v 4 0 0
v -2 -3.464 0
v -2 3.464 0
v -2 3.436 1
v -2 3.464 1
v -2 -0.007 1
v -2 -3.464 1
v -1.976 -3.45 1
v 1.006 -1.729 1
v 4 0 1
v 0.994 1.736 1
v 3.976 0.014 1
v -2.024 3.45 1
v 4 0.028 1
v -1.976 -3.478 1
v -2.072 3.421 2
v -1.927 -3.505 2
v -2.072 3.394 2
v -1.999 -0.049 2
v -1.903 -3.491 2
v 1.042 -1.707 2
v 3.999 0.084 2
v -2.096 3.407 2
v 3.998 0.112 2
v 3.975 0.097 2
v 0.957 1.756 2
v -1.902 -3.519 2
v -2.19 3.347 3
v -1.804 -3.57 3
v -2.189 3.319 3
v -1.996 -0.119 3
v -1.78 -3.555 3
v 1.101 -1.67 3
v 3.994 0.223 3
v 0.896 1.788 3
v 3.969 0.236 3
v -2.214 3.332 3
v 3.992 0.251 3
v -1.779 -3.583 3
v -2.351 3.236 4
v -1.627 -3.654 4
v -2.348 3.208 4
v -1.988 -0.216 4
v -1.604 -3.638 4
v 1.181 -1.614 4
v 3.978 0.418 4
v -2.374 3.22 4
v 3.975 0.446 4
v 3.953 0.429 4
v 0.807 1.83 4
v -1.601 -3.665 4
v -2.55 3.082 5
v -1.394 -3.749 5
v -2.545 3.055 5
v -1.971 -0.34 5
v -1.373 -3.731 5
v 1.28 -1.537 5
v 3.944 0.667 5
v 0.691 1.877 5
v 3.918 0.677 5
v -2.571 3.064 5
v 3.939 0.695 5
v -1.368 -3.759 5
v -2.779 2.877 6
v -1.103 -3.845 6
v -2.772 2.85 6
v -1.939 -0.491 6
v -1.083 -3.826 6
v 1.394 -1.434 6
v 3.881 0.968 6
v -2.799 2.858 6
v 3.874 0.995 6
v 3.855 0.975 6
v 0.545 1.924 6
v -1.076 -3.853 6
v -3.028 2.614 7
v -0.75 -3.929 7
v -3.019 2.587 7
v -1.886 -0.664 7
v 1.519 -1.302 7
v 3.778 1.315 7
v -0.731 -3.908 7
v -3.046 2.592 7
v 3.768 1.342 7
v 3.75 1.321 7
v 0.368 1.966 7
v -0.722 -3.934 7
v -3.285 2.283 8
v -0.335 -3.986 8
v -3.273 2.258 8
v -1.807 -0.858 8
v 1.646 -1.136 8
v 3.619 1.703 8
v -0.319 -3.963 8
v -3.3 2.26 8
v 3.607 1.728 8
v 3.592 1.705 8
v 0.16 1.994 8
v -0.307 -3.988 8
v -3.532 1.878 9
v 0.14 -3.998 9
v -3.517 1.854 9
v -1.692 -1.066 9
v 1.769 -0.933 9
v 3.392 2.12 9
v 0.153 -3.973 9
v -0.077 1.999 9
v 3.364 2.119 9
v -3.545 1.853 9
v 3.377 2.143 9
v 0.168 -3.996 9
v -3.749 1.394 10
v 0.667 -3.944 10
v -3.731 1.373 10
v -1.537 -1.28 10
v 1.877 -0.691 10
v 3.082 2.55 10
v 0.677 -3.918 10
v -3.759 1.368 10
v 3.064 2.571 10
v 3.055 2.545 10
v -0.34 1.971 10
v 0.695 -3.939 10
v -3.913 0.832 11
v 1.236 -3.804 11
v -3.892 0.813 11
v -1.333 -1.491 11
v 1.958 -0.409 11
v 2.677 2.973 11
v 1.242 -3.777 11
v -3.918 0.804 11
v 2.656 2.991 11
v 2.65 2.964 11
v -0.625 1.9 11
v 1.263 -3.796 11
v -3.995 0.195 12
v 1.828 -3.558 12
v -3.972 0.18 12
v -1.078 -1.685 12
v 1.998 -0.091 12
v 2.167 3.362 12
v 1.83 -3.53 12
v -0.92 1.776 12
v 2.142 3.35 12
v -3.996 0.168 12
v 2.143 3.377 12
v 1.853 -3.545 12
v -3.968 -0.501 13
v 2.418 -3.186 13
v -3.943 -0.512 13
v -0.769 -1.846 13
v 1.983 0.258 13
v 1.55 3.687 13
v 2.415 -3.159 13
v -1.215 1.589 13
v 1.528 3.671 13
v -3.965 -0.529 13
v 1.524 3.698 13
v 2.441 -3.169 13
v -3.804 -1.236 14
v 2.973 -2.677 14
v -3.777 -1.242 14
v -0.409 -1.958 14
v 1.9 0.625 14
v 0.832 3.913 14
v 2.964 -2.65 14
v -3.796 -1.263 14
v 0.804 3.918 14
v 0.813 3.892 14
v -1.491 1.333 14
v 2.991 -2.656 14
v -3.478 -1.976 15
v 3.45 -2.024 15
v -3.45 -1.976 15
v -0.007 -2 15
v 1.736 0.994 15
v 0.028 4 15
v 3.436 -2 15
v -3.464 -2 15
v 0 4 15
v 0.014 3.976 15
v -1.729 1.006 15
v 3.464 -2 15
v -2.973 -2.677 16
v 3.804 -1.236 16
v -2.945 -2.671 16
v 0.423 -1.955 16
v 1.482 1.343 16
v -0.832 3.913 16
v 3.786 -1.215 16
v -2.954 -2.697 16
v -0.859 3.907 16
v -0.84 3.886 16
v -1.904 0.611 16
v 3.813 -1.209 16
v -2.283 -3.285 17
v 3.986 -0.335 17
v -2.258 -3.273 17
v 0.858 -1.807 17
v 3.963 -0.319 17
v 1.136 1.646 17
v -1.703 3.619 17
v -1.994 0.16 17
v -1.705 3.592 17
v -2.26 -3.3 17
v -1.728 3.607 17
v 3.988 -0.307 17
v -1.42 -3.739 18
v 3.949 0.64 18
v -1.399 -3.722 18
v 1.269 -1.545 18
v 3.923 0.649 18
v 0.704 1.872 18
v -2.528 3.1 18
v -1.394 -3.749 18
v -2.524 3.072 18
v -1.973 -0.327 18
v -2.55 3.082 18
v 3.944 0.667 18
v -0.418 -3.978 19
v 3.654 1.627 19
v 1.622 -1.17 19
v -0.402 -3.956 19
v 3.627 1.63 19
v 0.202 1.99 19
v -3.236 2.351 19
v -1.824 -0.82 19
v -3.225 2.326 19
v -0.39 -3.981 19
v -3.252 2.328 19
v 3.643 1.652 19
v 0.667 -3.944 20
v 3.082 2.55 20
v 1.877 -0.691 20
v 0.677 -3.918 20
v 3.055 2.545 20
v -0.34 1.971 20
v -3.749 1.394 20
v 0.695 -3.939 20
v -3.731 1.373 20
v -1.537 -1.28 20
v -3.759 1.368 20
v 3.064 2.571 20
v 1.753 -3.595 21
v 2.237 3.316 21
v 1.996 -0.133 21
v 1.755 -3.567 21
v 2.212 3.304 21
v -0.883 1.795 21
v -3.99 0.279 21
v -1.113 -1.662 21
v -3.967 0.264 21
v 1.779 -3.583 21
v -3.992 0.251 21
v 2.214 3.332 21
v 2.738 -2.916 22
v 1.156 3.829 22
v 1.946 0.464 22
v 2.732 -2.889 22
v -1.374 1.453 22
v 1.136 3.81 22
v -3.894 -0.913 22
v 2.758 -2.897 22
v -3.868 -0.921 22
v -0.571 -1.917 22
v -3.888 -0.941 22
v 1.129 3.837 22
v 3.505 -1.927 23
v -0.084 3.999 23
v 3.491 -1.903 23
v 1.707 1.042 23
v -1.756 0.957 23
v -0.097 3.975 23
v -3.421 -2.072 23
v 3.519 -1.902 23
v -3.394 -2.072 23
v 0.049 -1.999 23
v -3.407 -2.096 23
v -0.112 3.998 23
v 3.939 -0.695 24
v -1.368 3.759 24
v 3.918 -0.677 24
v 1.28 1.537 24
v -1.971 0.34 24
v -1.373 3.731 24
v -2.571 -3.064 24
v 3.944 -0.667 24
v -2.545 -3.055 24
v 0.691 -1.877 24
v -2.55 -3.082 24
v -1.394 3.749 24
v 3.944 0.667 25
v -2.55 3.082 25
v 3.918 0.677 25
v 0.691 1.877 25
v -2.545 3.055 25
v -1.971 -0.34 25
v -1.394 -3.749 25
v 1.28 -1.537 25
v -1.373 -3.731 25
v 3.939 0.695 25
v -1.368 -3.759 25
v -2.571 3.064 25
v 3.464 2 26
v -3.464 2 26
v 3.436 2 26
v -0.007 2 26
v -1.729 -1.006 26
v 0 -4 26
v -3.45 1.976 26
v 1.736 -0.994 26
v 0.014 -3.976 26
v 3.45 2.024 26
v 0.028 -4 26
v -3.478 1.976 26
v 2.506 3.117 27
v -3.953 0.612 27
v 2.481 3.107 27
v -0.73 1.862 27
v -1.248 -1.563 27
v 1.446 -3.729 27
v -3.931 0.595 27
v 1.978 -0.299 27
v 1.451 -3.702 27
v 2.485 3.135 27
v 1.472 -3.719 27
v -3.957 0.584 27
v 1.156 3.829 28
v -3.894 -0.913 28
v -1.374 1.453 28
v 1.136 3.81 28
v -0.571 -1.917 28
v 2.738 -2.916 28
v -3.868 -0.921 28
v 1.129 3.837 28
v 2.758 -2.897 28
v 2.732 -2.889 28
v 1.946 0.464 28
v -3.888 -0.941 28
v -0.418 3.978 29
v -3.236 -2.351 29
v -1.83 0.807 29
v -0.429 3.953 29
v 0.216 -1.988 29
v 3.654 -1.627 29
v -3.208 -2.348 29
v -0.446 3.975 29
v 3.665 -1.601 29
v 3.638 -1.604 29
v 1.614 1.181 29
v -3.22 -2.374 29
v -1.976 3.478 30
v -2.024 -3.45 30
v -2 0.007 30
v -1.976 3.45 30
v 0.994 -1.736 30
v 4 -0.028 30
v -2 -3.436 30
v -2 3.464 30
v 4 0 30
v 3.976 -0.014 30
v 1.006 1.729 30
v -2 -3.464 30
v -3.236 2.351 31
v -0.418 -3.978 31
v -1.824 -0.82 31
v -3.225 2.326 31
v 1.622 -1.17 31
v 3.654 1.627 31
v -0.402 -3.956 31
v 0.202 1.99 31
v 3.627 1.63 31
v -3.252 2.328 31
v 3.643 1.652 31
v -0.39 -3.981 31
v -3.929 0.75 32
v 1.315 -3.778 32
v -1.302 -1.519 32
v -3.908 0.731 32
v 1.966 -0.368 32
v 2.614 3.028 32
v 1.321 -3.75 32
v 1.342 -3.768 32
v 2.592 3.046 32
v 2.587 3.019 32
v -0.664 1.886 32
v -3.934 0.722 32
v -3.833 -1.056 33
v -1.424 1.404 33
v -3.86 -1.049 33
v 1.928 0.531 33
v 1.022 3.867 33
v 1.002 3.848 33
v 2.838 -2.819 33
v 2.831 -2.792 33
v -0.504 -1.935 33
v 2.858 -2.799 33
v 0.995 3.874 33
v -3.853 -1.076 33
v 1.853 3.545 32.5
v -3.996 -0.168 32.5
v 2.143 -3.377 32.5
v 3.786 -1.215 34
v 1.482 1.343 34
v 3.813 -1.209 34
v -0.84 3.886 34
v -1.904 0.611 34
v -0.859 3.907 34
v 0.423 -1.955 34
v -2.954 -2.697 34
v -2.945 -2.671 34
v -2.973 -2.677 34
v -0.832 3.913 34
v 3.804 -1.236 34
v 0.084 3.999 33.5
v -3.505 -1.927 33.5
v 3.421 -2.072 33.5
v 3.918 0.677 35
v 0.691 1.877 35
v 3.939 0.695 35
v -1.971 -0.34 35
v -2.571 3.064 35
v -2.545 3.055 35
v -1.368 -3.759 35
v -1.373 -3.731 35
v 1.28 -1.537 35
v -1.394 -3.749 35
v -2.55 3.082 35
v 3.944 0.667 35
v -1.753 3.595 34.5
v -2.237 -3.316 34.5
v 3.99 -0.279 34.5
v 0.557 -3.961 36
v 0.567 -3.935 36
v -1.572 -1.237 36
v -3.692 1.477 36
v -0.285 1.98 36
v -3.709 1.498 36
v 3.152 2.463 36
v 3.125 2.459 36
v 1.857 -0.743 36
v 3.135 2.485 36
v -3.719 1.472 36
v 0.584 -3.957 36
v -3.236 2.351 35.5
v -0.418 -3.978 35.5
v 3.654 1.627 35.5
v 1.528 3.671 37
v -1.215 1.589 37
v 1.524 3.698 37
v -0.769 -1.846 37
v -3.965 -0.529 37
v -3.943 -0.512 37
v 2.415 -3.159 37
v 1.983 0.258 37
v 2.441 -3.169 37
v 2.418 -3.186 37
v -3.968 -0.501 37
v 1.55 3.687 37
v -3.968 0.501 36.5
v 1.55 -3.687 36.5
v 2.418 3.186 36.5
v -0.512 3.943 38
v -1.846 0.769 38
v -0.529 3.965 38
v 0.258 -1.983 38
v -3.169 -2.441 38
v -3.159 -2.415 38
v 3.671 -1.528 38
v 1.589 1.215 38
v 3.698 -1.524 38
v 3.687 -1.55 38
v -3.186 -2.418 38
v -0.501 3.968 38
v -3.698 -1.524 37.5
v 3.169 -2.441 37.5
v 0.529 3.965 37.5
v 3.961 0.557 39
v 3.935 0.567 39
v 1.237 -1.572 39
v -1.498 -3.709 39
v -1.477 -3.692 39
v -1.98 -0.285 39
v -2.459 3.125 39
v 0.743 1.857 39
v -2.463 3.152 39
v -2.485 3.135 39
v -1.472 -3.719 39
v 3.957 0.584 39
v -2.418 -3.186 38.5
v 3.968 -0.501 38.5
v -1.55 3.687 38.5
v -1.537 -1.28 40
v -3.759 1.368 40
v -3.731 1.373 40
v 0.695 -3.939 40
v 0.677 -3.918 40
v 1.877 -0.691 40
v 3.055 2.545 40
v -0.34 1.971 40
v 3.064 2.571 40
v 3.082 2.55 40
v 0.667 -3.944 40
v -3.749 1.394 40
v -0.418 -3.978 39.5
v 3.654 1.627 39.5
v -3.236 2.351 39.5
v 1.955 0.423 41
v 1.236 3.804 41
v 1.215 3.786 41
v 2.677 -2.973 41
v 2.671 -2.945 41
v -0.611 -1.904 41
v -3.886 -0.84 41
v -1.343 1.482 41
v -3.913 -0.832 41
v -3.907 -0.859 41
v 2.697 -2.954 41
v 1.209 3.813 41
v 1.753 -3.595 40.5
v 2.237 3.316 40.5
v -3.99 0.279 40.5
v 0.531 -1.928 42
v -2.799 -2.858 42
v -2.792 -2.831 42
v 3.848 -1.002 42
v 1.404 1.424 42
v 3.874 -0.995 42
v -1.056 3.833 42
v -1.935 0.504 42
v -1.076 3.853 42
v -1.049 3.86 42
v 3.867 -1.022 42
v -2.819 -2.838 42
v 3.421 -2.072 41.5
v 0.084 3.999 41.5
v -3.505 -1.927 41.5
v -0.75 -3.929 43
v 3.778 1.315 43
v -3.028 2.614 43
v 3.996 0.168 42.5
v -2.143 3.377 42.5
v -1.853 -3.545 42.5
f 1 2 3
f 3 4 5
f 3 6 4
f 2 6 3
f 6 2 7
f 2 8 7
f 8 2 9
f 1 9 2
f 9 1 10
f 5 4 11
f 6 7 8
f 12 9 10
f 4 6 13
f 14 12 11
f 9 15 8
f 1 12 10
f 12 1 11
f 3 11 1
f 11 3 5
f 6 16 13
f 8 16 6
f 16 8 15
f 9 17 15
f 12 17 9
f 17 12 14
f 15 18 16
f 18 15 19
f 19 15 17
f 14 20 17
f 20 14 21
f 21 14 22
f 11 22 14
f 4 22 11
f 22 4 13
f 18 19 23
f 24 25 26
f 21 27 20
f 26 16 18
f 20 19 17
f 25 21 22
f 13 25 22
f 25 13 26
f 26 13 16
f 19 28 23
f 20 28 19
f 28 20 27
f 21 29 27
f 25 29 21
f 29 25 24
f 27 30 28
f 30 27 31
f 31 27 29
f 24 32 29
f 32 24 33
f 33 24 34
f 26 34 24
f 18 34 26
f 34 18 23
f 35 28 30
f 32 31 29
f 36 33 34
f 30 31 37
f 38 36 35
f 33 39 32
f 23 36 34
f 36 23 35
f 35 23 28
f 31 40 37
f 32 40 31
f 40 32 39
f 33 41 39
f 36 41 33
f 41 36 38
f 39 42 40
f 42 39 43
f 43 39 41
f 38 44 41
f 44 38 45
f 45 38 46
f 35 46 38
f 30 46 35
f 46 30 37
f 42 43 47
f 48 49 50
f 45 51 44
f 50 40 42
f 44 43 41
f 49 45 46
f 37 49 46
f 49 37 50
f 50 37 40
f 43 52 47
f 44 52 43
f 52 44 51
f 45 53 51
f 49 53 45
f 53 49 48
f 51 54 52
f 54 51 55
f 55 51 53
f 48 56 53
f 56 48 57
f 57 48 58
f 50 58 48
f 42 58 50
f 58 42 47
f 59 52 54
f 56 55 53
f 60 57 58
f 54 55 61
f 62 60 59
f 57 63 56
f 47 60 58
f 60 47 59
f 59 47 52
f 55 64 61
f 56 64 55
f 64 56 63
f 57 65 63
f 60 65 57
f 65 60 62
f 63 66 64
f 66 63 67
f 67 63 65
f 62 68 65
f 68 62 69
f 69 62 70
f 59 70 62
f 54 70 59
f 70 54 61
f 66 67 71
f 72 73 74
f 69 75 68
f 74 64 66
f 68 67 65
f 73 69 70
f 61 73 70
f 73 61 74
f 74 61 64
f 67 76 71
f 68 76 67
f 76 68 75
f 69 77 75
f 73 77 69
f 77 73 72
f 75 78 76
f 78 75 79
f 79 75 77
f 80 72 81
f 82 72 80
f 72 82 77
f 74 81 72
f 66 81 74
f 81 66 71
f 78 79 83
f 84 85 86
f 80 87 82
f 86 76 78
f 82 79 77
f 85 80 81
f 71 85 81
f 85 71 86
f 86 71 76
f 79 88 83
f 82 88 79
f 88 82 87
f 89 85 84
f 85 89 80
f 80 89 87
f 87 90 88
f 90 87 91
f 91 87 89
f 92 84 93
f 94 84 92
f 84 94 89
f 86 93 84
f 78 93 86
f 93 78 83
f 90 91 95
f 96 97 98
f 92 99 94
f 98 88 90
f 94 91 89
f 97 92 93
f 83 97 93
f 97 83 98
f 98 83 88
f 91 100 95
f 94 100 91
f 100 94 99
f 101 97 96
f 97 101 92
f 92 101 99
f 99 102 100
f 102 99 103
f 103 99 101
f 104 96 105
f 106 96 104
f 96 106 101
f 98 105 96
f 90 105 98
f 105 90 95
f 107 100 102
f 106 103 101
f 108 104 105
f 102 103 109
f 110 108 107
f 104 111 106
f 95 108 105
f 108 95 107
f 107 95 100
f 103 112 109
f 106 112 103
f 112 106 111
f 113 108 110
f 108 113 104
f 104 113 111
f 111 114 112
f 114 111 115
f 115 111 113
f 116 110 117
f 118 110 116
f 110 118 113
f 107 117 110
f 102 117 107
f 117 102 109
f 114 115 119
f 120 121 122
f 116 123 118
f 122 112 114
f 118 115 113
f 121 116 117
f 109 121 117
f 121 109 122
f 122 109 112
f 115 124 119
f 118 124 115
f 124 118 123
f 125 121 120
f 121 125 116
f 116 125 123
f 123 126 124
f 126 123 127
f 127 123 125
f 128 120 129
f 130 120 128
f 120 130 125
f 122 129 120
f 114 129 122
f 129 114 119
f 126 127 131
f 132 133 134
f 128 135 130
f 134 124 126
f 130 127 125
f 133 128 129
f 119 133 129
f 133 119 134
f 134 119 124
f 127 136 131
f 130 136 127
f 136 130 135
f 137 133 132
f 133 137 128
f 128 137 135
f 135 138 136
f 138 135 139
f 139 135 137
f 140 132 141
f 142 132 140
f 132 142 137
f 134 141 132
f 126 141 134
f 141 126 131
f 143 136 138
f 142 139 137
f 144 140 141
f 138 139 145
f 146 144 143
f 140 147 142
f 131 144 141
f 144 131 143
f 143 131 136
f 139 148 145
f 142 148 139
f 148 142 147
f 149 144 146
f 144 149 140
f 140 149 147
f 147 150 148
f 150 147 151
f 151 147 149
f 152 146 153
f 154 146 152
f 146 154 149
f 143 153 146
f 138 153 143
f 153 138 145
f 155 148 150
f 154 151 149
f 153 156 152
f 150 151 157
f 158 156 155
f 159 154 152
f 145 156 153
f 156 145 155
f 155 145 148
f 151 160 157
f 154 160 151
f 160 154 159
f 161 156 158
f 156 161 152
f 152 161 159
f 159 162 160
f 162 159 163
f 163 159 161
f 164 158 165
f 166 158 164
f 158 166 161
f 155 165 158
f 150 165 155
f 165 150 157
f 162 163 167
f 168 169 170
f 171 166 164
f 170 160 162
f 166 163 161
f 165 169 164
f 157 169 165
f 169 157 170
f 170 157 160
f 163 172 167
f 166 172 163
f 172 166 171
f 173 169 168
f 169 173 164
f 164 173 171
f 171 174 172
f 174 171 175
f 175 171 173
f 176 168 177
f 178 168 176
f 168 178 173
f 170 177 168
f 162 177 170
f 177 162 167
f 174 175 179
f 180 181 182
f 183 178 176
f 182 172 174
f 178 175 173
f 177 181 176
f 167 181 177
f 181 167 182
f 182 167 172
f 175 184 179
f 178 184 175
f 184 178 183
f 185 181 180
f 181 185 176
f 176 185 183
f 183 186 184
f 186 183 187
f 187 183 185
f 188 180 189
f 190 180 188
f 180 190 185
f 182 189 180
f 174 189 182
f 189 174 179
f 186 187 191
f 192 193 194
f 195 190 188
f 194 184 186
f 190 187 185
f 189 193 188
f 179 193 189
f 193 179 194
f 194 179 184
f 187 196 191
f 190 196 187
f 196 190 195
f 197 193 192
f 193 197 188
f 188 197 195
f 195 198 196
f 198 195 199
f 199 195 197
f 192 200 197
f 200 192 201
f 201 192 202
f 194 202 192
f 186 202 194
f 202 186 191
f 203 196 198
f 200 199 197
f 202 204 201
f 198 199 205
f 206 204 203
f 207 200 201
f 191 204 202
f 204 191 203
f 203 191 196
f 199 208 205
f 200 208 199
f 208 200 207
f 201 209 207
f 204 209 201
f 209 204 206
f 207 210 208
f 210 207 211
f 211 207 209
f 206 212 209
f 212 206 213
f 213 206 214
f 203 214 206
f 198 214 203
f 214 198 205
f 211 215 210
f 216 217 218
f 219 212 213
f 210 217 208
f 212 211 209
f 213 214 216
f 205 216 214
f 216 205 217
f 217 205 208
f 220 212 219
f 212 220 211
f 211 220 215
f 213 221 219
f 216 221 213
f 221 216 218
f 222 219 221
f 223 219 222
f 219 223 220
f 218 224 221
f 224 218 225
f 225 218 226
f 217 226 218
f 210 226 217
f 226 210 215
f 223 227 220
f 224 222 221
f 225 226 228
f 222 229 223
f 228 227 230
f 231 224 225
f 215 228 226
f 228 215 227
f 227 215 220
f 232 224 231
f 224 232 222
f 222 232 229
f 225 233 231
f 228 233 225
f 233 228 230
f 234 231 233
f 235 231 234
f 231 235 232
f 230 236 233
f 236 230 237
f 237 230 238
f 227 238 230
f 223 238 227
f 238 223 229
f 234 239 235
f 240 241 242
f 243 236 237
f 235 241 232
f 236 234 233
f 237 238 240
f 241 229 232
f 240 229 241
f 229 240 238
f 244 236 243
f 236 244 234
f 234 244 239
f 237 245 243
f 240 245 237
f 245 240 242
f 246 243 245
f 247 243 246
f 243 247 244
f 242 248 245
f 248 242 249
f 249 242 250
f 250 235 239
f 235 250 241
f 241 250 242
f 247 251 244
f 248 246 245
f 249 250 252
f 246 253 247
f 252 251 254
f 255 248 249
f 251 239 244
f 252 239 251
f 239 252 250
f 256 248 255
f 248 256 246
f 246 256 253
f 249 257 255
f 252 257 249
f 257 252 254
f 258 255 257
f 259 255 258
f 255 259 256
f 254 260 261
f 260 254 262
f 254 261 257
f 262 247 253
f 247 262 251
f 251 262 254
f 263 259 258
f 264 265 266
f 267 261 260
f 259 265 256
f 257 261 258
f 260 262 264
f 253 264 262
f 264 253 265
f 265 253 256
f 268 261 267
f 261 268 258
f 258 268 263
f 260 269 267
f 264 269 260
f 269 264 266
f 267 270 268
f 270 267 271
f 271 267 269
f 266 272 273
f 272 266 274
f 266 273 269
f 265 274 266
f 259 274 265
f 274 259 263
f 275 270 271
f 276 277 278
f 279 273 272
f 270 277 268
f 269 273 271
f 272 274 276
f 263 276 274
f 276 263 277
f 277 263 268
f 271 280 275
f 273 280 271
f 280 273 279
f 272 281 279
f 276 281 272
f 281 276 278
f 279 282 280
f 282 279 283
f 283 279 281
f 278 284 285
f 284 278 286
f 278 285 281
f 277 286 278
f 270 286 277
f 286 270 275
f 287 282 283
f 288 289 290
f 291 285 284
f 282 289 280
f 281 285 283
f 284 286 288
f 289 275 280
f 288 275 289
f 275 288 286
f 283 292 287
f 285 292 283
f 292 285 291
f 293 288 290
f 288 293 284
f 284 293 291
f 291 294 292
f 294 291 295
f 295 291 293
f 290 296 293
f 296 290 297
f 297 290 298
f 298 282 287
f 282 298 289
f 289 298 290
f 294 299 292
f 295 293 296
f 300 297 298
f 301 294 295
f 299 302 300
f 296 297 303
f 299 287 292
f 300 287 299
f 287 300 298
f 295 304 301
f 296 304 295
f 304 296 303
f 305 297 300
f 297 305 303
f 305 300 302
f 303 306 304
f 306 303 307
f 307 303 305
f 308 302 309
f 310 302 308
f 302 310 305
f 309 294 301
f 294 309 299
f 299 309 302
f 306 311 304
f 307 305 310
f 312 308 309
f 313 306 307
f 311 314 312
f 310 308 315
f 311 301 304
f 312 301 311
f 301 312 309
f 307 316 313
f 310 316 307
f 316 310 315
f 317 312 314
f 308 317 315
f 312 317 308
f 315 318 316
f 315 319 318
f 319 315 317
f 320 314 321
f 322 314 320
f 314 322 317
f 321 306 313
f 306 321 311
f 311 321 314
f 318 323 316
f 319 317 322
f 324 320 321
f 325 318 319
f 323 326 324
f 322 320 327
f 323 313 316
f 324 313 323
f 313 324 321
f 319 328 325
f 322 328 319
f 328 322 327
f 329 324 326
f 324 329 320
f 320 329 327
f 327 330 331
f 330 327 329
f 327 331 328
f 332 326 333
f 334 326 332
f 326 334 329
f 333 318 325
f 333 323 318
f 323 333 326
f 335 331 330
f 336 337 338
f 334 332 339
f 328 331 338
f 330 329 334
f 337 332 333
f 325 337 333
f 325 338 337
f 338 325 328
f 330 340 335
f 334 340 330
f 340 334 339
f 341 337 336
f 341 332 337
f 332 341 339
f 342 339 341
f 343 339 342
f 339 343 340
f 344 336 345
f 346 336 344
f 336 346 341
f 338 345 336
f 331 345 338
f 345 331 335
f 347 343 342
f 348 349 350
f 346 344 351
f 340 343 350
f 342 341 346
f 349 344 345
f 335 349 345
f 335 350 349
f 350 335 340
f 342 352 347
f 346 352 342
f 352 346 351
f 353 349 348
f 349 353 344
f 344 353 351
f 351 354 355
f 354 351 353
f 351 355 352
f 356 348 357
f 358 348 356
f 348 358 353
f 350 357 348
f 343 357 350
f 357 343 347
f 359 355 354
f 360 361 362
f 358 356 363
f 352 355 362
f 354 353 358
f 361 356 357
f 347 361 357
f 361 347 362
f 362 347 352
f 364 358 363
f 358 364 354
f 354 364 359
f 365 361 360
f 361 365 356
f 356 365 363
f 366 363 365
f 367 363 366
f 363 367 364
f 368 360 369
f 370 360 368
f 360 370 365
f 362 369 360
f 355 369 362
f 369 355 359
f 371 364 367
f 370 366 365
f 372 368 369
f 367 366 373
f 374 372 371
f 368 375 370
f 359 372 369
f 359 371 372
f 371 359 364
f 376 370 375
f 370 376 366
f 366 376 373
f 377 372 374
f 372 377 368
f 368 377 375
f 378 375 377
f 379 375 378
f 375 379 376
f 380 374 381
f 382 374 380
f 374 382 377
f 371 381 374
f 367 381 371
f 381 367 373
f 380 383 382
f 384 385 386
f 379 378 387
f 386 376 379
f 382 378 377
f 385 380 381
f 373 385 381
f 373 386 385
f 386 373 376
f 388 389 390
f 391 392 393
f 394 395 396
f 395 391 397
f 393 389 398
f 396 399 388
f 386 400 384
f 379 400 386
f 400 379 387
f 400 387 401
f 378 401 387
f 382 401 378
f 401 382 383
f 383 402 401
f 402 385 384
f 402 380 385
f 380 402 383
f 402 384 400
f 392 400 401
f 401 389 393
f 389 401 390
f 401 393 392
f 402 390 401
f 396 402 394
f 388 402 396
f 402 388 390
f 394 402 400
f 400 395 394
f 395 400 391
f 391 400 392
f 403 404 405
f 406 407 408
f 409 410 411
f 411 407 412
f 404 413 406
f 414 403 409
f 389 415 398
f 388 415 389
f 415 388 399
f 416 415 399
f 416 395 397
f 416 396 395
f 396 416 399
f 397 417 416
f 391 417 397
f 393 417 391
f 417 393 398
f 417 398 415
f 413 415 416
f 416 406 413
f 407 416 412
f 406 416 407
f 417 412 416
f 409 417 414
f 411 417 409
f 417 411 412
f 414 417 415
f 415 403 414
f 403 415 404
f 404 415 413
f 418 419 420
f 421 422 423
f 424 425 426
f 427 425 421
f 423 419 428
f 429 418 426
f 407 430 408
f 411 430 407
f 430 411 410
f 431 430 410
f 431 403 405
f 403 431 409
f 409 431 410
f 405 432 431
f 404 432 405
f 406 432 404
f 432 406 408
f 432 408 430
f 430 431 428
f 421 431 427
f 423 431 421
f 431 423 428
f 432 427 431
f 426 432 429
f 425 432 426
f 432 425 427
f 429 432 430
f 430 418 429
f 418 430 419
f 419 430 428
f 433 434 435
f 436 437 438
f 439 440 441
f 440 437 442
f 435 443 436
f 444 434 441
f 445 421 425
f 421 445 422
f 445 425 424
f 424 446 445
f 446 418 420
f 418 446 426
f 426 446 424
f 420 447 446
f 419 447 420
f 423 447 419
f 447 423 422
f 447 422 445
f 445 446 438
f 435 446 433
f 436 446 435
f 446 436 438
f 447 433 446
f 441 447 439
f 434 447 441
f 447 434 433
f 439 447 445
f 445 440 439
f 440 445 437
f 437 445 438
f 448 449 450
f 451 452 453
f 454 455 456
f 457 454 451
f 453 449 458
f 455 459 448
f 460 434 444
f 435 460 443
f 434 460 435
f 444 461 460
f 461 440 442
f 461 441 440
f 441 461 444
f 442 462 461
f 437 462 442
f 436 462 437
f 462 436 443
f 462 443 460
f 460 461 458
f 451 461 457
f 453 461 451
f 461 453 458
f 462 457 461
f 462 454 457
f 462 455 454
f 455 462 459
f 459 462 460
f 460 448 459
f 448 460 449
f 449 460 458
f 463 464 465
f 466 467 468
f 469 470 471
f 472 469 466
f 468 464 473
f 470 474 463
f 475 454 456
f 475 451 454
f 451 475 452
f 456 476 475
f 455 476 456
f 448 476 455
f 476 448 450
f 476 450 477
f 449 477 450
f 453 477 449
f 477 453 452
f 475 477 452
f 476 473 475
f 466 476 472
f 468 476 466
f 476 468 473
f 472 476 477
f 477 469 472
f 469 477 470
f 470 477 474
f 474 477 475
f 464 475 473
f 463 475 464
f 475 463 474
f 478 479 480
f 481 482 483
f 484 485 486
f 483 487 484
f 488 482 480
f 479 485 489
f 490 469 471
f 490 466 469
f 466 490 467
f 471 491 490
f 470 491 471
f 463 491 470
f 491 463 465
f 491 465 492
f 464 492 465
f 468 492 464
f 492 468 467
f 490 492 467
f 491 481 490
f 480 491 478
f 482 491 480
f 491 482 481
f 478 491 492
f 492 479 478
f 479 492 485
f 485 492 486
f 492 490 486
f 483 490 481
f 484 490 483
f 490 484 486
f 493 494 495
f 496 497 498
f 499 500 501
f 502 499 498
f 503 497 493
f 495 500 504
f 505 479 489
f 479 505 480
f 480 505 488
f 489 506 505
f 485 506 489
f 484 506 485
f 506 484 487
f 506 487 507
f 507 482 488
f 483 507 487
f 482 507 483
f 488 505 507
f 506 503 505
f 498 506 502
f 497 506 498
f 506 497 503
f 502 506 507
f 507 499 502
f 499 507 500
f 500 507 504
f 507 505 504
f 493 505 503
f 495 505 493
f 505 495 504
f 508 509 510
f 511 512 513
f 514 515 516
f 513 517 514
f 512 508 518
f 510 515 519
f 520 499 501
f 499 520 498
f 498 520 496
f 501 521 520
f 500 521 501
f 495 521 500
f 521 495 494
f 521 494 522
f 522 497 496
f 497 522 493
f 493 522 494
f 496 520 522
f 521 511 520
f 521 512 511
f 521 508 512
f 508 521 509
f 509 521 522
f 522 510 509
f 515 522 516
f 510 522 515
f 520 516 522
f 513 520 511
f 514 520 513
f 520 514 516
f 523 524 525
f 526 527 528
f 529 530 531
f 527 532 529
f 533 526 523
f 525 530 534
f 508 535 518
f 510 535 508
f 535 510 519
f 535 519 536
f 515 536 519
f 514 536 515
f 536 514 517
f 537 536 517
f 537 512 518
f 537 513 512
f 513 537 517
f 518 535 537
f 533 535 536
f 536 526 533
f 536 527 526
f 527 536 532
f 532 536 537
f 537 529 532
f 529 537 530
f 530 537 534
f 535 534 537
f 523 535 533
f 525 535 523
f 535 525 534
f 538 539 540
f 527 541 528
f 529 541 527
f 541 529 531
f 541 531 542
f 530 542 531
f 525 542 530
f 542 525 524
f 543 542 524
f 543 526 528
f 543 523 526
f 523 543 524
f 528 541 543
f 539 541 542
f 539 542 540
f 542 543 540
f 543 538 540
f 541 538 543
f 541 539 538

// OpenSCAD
layers = 42;
turn_speed = 0.8;

for(l = [0:layers]) {
	//Calculate twist so far.
	a = l * l / 2 * turn_speed;
	
	translate([0, 0, l]) {
		rotate([0, 0, a]) {
			linear_extrude(height=1, twist = -l * turn_speed) {
				circle(r=4, $fn=3);
			}
		}
	}
}
